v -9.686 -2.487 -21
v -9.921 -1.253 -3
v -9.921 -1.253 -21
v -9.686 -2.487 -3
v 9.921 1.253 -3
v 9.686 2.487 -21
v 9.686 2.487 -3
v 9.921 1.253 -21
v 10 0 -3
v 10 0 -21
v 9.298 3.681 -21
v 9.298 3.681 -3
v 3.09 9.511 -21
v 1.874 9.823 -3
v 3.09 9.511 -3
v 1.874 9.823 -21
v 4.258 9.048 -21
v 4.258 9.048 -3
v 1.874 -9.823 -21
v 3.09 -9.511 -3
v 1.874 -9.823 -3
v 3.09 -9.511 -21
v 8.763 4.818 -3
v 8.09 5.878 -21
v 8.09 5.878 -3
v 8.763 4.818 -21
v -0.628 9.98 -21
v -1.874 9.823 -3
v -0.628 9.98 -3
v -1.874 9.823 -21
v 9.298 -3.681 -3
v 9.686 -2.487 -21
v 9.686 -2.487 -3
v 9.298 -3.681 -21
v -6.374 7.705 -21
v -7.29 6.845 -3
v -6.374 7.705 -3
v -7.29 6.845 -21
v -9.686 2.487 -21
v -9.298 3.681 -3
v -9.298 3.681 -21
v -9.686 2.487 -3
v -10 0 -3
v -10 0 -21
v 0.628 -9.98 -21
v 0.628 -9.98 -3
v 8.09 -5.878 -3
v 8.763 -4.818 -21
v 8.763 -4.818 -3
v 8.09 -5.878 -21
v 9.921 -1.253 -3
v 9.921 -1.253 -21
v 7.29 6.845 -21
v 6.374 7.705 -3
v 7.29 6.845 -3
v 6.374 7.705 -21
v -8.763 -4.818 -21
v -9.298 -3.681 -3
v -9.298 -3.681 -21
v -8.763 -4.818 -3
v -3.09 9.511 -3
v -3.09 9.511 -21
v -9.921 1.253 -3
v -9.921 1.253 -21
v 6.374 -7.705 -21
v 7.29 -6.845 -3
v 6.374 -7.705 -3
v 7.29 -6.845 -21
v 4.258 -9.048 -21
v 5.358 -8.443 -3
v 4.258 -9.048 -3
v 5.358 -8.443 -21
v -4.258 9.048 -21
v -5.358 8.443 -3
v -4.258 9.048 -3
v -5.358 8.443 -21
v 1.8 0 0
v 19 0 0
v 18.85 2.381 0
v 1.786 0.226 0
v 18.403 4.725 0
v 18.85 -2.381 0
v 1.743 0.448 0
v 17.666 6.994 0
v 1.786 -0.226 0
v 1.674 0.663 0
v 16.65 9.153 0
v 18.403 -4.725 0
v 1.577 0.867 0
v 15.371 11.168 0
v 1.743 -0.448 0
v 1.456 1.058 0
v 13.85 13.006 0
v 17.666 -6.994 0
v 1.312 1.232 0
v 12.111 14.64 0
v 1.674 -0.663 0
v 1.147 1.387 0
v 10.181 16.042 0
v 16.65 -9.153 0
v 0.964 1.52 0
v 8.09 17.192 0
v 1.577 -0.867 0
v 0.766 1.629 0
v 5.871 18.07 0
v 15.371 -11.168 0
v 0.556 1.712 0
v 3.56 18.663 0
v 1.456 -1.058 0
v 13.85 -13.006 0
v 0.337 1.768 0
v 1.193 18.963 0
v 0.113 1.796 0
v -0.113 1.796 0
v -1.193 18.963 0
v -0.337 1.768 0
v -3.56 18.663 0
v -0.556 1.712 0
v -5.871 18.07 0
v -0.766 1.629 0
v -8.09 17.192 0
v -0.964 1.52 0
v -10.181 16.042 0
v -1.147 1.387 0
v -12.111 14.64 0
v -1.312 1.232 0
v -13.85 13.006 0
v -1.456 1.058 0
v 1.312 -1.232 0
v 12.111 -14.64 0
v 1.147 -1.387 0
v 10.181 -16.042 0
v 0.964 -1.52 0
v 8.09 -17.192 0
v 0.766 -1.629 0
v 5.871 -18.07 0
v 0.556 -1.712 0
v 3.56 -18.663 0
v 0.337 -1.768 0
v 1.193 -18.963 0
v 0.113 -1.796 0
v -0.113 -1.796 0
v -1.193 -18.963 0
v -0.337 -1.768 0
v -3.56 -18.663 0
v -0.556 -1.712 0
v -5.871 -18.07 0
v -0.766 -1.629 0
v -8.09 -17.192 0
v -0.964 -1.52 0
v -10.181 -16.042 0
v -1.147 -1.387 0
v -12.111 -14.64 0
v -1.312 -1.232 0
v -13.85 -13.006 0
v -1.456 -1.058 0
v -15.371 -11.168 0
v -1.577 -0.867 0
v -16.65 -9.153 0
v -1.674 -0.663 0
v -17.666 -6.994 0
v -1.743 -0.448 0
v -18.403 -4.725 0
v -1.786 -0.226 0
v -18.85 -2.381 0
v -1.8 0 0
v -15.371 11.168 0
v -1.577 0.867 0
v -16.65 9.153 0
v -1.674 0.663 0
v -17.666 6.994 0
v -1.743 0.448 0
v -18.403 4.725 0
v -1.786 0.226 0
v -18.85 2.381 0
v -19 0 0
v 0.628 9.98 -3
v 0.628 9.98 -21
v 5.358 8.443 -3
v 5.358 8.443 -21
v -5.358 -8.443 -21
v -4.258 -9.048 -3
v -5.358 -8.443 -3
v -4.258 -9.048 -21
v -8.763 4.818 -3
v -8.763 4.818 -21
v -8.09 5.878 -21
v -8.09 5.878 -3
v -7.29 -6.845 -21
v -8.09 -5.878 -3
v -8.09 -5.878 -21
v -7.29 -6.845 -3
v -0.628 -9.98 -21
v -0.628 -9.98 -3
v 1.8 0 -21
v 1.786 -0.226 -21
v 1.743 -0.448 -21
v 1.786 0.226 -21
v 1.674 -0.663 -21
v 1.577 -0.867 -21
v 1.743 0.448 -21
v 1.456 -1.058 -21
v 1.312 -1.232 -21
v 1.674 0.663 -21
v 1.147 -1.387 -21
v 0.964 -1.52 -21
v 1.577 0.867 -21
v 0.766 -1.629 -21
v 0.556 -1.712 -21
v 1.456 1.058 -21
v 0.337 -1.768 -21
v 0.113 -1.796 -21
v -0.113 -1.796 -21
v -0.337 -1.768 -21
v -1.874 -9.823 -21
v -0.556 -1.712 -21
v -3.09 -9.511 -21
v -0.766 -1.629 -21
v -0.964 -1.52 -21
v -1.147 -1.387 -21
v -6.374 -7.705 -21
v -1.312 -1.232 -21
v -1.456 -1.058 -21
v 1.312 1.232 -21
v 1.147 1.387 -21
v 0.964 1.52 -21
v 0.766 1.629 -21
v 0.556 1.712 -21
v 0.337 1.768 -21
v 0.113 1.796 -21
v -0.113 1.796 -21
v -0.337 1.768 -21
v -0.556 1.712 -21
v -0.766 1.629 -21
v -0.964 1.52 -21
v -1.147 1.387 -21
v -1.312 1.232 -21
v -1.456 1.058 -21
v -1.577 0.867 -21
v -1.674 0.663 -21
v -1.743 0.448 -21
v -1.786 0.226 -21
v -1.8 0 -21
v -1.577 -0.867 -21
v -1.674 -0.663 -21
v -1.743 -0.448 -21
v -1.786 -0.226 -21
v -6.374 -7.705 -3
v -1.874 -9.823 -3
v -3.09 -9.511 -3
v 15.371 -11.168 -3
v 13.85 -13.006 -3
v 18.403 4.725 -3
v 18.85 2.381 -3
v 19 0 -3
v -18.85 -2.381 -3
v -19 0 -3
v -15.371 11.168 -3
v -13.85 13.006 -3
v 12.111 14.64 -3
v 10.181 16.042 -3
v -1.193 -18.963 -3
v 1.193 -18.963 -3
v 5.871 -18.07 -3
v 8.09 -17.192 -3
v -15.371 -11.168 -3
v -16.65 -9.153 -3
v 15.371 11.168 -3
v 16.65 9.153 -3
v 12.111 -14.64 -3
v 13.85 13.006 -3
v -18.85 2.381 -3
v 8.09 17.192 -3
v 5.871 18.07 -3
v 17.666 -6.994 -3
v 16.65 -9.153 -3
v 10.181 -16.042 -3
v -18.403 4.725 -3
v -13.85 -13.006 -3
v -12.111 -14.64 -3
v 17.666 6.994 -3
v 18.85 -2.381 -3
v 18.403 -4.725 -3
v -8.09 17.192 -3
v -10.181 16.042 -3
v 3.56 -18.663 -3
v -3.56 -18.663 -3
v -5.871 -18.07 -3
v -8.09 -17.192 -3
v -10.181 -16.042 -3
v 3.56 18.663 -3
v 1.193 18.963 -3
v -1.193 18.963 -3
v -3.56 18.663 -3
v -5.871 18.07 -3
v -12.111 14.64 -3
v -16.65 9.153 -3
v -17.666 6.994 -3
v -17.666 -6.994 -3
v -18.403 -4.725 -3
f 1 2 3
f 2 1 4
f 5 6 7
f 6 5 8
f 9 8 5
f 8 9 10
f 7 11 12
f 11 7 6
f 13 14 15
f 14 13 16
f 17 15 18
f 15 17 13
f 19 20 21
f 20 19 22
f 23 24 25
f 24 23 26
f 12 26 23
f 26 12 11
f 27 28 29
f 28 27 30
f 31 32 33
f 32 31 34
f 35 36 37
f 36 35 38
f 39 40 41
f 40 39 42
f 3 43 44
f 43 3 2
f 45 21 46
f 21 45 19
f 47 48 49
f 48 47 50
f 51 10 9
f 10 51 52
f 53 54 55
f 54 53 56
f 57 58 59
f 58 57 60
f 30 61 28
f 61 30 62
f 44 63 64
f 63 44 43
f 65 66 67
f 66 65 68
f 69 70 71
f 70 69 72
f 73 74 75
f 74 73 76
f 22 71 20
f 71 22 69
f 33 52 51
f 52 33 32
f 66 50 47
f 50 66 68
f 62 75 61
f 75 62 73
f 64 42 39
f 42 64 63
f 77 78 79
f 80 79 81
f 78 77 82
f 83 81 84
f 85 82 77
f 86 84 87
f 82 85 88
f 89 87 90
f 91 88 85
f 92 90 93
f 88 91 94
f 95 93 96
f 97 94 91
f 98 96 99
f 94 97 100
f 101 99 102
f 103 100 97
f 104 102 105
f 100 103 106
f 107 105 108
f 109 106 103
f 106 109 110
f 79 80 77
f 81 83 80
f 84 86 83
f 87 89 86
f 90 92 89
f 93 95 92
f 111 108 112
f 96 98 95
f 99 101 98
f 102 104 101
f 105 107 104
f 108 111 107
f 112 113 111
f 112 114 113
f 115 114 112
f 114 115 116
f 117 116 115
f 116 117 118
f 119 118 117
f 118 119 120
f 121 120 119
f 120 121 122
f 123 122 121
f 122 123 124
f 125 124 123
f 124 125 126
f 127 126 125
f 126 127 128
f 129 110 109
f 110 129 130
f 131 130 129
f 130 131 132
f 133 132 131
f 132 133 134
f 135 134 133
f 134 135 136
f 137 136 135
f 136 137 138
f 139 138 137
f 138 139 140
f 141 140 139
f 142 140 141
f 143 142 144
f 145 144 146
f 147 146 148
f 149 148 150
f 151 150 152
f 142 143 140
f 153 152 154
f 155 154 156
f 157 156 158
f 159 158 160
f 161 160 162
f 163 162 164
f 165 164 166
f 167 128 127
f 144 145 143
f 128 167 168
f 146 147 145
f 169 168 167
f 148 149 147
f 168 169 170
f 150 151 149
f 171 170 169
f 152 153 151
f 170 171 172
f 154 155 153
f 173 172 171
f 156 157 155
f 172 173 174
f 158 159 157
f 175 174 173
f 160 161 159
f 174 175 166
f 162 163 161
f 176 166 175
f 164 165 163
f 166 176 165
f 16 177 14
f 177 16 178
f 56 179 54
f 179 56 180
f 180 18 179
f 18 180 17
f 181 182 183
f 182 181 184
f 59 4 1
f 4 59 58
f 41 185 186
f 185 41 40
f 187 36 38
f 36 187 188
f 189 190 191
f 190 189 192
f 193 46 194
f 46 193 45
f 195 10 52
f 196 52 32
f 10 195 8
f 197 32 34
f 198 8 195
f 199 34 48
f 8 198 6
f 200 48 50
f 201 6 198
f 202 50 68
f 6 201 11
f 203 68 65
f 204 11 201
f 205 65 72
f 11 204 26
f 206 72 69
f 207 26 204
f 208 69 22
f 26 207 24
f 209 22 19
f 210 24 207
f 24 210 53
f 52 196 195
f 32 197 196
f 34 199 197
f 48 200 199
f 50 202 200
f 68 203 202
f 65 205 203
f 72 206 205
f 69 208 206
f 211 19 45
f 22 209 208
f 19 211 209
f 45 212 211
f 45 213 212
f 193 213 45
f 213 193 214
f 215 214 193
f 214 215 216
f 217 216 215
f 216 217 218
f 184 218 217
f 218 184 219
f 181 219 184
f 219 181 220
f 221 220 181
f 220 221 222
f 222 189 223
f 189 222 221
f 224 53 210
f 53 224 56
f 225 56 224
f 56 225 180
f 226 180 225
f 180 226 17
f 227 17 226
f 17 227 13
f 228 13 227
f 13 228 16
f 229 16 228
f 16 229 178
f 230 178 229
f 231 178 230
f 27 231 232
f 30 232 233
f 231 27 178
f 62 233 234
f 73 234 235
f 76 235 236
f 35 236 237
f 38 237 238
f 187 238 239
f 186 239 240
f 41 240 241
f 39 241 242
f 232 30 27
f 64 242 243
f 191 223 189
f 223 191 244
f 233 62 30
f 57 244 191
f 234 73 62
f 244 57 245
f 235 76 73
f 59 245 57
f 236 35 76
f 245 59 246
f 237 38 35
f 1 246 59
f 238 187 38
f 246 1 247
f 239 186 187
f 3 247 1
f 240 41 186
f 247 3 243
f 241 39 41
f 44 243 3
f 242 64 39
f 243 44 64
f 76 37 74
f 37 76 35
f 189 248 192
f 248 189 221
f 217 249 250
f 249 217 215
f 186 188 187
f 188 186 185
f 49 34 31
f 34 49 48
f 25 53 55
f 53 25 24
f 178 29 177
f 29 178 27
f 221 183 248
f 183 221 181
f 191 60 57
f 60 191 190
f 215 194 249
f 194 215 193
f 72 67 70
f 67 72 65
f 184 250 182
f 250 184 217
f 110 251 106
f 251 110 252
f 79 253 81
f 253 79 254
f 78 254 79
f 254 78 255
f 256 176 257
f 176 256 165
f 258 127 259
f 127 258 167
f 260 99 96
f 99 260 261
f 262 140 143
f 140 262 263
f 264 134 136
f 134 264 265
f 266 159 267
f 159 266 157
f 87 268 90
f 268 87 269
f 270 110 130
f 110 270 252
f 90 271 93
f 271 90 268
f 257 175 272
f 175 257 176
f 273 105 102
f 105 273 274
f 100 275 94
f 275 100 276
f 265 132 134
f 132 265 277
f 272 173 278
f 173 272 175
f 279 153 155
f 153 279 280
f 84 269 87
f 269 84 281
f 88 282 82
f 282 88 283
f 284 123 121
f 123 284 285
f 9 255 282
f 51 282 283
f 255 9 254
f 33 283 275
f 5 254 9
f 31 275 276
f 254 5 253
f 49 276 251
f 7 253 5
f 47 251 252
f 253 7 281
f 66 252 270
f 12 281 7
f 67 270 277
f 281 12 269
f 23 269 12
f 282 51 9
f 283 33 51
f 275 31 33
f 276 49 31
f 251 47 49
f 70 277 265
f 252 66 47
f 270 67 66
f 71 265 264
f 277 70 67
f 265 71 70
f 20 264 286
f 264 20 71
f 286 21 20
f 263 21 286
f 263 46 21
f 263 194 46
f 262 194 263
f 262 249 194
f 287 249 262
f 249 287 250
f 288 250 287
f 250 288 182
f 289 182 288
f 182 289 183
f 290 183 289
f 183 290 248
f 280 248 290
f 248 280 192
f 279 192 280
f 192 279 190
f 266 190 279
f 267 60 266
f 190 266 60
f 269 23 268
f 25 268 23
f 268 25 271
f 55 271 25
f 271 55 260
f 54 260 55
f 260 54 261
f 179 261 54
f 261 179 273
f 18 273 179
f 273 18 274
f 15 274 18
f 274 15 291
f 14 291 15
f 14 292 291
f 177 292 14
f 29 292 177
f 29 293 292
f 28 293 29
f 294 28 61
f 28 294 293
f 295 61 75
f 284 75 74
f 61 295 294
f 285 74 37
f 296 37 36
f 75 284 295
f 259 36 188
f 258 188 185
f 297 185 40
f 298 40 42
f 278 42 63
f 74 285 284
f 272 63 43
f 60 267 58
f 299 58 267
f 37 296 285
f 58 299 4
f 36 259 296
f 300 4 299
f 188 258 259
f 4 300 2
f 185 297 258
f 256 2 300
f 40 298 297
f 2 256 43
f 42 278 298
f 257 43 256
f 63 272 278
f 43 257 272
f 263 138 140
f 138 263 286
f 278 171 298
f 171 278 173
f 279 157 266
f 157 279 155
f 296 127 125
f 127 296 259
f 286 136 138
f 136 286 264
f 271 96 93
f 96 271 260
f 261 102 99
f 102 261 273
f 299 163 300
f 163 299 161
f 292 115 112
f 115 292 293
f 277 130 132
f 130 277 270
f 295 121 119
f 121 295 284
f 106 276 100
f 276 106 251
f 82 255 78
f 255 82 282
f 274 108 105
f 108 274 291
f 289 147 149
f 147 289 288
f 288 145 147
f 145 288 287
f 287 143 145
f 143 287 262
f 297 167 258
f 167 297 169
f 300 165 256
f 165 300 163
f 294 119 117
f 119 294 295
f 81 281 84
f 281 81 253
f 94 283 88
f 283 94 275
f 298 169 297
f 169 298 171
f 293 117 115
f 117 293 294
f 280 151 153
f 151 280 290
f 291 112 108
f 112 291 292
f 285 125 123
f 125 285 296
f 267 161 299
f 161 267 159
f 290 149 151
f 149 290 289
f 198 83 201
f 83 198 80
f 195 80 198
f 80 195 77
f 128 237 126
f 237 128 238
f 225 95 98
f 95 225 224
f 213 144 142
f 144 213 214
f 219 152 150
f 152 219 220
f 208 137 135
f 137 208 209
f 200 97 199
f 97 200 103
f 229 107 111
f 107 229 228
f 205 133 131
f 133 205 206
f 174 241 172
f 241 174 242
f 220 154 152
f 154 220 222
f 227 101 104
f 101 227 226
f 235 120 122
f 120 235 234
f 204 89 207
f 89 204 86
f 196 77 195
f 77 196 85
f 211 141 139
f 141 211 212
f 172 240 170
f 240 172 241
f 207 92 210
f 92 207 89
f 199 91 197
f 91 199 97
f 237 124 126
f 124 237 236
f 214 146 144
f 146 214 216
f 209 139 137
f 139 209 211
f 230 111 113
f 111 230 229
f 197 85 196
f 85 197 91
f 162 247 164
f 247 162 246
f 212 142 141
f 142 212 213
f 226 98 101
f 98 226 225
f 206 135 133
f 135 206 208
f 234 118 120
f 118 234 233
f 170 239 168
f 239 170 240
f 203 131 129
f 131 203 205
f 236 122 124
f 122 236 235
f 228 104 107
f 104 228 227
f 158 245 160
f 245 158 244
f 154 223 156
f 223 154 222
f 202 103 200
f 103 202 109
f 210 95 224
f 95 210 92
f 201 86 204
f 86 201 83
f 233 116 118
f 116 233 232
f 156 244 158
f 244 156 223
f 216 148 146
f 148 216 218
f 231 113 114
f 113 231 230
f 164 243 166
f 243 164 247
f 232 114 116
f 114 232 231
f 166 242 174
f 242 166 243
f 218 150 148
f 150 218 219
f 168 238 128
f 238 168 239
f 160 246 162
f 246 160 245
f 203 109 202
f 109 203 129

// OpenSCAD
$fn = 50;


difference() {
	union() {
		translate(v = [0, 0, -21.0000000000]) {
			cylinder(h = 21, r = 10.0000000000);
		}
		translate(v = [0, 0, -3.0000000000]) {
			cylinder(h = 3, r = 19.0000000000);
		}
	}
	union() {
		#translate(v = [0, 0, -21]) {
			cylinder(h = 21, r = 1.8000000000);
		}
	}
}
